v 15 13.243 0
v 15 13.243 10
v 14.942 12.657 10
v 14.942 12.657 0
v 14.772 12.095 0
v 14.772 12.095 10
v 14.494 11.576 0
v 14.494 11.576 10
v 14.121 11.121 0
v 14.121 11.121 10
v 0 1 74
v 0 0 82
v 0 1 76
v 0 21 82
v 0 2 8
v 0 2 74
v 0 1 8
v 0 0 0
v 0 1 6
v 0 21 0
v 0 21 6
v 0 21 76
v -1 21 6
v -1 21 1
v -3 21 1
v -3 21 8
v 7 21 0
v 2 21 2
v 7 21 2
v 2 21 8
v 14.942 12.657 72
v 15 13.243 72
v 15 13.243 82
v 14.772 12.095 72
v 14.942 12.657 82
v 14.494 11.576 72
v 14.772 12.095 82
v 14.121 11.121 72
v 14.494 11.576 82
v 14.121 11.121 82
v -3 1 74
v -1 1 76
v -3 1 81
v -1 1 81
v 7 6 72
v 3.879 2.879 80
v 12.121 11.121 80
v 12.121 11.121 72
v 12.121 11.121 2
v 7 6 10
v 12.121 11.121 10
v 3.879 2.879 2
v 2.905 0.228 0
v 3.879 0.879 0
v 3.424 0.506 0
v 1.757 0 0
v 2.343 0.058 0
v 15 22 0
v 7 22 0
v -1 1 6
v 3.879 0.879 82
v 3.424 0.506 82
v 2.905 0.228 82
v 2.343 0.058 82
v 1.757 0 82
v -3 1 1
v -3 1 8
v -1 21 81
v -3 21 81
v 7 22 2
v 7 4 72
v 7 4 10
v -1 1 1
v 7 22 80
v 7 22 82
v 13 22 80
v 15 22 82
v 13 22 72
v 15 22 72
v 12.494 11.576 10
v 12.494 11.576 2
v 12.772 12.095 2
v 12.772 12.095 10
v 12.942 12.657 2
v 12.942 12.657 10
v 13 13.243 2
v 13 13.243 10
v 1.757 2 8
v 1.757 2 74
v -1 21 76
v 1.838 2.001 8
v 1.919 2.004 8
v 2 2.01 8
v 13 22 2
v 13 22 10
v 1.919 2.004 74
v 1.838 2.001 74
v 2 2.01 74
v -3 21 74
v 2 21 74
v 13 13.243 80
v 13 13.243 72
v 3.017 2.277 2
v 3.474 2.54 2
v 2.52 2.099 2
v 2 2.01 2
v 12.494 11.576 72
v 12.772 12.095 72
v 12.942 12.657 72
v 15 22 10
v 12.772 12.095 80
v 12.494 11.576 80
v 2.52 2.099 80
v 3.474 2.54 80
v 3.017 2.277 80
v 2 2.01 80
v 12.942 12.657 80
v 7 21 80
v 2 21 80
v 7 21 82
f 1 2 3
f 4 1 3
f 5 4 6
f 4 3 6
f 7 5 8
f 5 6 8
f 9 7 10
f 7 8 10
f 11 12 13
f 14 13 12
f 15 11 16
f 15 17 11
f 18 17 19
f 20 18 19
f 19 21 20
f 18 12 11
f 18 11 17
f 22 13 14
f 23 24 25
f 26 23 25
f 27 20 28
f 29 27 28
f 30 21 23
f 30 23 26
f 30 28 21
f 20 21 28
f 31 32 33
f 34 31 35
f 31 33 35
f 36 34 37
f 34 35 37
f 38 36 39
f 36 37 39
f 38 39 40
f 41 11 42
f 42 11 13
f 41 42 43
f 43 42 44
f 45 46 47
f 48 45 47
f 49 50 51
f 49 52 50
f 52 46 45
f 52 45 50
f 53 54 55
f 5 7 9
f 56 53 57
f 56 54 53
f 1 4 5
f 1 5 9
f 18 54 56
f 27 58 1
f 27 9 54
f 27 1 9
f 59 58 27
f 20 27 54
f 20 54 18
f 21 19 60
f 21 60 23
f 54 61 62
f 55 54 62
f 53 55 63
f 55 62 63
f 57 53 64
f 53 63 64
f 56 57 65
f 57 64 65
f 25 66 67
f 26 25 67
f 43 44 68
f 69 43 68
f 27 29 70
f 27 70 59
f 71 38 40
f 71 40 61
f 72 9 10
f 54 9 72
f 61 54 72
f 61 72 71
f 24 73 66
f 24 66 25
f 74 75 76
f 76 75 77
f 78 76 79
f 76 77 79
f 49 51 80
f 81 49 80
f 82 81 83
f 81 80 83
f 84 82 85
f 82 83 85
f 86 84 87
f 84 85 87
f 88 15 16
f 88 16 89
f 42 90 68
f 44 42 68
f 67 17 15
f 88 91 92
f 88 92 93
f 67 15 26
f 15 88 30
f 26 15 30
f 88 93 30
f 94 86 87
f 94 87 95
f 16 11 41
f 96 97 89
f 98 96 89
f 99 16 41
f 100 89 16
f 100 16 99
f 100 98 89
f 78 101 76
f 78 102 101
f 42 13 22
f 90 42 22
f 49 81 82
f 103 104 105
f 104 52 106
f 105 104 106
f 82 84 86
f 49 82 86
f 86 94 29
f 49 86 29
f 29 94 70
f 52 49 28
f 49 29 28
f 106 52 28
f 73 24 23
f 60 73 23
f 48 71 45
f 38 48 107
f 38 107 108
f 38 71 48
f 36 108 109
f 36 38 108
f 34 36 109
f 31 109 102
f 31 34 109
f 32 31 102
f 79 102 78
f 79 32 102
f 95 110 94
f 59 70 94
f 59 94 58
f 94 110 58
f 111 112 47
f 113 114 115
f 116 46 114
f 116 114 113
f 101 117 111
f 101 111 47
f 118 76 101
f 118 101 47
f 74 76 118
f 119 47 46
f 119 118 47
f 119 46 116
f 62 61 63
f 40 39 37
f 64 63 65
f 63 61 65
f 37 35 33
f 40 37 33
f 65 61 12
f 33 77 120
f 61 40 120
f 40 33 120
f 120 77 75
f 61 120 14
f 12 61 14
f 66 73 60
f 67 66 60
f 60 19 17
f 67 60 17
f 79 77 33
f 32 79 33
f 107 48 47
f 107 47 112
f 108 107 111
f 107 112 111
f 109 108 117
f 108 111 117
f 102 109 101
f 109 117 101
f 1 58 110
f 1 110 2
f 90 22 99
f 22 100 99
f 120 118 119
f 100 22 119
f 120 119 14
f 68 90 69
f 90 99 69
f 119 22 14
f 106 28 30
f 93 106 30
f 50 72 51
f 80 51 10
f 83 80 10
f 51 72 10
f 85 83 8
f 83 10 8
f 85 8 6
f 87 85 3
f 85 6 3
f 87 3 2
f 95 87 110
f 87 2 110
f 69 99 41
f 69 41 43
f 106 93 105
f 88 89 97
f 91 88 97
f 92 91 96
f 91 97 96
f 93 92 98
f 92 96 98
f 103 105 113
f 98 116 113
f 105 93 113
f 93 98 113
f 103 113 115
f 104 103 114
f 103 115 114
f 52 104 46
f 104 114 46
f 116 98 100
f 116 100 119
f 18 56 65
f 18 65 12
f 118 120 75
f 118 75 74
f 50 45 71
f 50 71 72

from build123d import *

# Parameters (mm, degrees)
EXTRUDE_1_DEPTH       = 82
FILLET_1_R            = 3
EXTRUDE_START         = -2
EXTRUDE_2_DEPTH       = 2
EXTRUDE_START_2       = -82
EXTRUDE_3_DEPTH       = 2
CUT_EXTRUDE_1_DEPTH   = 2
CUT_EXTRUDE_2_DEPTH   = 2
CUT_EXTRUDE_3_REACH   = 114.805
SKETCH_7_R            = 2
SKETCH_7_R_2          = 3.3
SKETCH_8_R            = 2
EXTRUDE_4_DEPTH       = 18
SKETCH_9_W            = 7
SKETCH_9_H            = 20
EXTRUDE_5_DEPTH       = 2
SKETCH_10_W           = 2
SKETCH_10_H           = 20
EXTRUDE_6_DEPTH       = 1
SKETCH_11_W           = 7
SKETCH_11_H           = 20
EXTRUDE_7_DEPTH       = 2
SKETCH_12_OUTSIDE_W   = 111.698
SKETCH_12_OUTSIDE_H   = 75.698
SKETCH_12_OUTSIDE_W_2 = 10
SKETCH_12_OUTSIDE_H_2 = 22
CUT_EXTRUDE_4_DEPTH   = 8
SKETCH_14_W           = 93.129876152
SKETCH_14_H           = 88.449918806
CUT_EXTRUDE_5_DEPTH   = 108.745069493


with BuildPart() as part:
    # 草图1 → 凸台-拉伸1 (new body)
    with BuildSketch(Plane.XY):
        Polygon((0, 0), (0, 2), (3, 2), (13, 12), (13, 37), (3, 47), (-60, 47), (-60, 49), (3, 49), (15, 37), (15, 12), (3, 0), align=None)
    extrude(amount=EXTRUDE_1_DEPTH)

    # 圆角1
    fillet_1_edges = [part.edges().sort_by_distance(p)[0] for p in [
        (3, 0, 41),
        (15, 12, 41),
        (15, 37, 41),
        (3, 49, 41),
        (3, 2, 41),
        (13, 12, 41),
        (13, 37, 41),
        (3, 47, 41),
    ]]
    fillet(fillet_1_edges, radius=FILLET_1_R)

    # 草图4 → 凸台-拉伸2 (add)
    with BuildSketch(Plane(origin=(0, 0, 0), x_dir=(-1, 0, 0), z_dir=(0, 0, -1)).offset(EXTRUDE_START)):
        with BuildLine():
            Line((0, 0), (0, 26))
            Line((0, 26), (4, 26))
            Line((4, 26), (4, 27))
            Line((4, 27), (60, 27))
            Line((60, 27), (60, 49))
            Line((60, 49), (-1.757359313, 49))
            ThreePointArc((-1.757359313, 49), (-2.90540961, 48.771638598), (-3.878679656, 48.121320344))
            Line((-3.878679656, 48.121320344), (-14.121320344, 37.878679656))
            ThreePointArc((-14.121320344, 37.878679656), (-14.771638598, 36.90540961), (-15, 35.757359313))
            Line((-15, 35.757359313), (-15, 13.242640687))
            ThreePointArc((-15, 13.242640687), (-14.771638598, 12.09459039), (-14.121320344, 11.121320344))
            Line((-14.121320344, 11.121320344), (-3.878679656, 0.878679656))
            ThreePointArc((-3.878679656, 0.878679656), (-2.90540961, 0.228361402), (-1.757359313, 0))
            Line((-1.757359313, 0), (0, 0))
        make_face()
    extrude(amount=EXTRUDE_2_DEPTH)

    # 草图4<2> → 凸台-拉伸3 (add)
    with BuildSketch(Plane(origin=(0, 0, 0), x_dir=(-1, 0, 0), z_dir=(0, 0, -1)).offset(EXTRUDE_START_2)):
        with BuildLine():
            Line((0, 0), (0, 26))
            Line((0, 26), (4, 26))
            Line((4, 26), (4, 27))
            Line((4, 27), (60, 27))
            Line((60, 27), (60, 49))
            Line((60, 49), (-1.757359313, 49))
            ThreePointArc((-1.757359313, 49), (-2.90540961, 48.771638598), (-3.878679656, 48.121320344))
            Line((-3.878679656, 48.121320344), (-14.121320344, 37.878679656))
            ThreePointArc((-14.121320344, 37.878679656), (-14.771638598, 36.90540961), (-15, 35.757359313))
            Line((-15, 35.757359313), (-15, 13.242640687))
            ThreePointArc((-15, 13.242640687), (-14.771638598, 12.09459039), (-14.121320344, 11.121320344))
            Line((-14.121320344, 11.121320344), (-3.878679656, 0.878679656))
            ThreePointArc((-3.878679656, 0.878679656), (-2.90540961, 0.228361402), (-1.757359313, 0))
            Line((-1.757359313, 0), (0, 0))
        make_face()
    extrude(amount=EXTRUDE_3_DEPTH)

    # 草图5 → 切除-拉伸1 (cut)
    with BuildSketch(Plane(origin=(0, 0, 0), x_dir=(-1, 0, 0), z_dir=(0, 0, -1))):
        Polygon((2.661599935, 45.0208), (2.661599935, 31), (0, 31), (0, 29.863095934), (55.9999896, 29.863095934), (55.9999896, 31), (53.469479015, 31), (53.469479015, 44.2999988), (37.469480535, 44.2999988), (37.469480535, 31), (36.113001155, 31), (36.113001155, 38.112), (19.512998795, 38.112), (19.512998795, 31), (17.861600015, 31), (17.861600015, 45.0208), align=None)
    extrude(amount=-CUT_EXTRUDE_1_DEPTH, mode=Mode.SUBTRACT)

    # 草图6 → 切除-拉伸2 (cut)
    with BuildSketch(Plane.XY.offset(82)):
        Polygon((-55.9999896, 31), (-49.543385864, 31), (-49.543385864, 37.1214), (-33.143393264, 37.1214), (-33.143393264, 32.1214), (-29.143393264, 32.1214), (-29.143393264, 31), (-10.34416017, 31), (-10.34416017, 33.50000008), (-6.34416055, 33.50000008), (-6.34416055, 31), (0, 31), (0, 27), (0, 26), (-4, 26), (-4, 27), (-55.9999896, 27), align=None)
    extrude(amount=-CUT_EXTRUDE_2_DEPTH, mode=Mode.SUBTRACT)

    # 草图7 → 切除-拉伸3 (cut, up to next)
    with BuildSketch(Plane(origin=(0, 49, 0), x_dir=(1, 0, 0), z_dir=(0, 1, 0)), mode=Mode.PRIVATE) as cut_extrude_3_sk1:
        with Locations((-52.4947896, -81.4948)):
            Circle(SKETCH_7_R)
    cut_extrude_3_tool1 = extrude(cut_extrude_3_sk1.sketch, amount=-CUT_EXTRUDE_3_REACH, mode=Mode.PRIVATE) & part.part
    # 草图7 → 切除-拉伸3 (cut, up to next)
    with BuildSketch(Plane(origin=(0, 49, 0), x_dir=(1, 0, 0), z_dir=(0, 1, 0)), mode=Mode.PRIVATE) as cut_extrude_3_sk2:
        with Locations((-3.4981896, -81.4948)):
            Circle(SKETCH_7_R)
    cut_extrude_3_tool2 = extrude(cut_extrude_3_sk2.sketch, amount=-CUT_EXTRUDE_3_REACH, mode=Mode.PRIVATE) & part.part
    # 草图7 → 切除-拉伸3 (cut, up to next)
    with BuildSketch(Plane(origin=(0, 49, 0), x_dir=(1, 0, 0), z_dir=(0, 1, 0)), mode=Mode.PRIVATE) as cut_extrude_3_sk3:
        with Locations((-43.742640687, -20.5)):
            Circle(SKETCH_7_R_2)
    cut_extrude_3_tool3 = extrude(cut_extrude_3_sk3.sketch, amount=-CUT_EXTRUDE_3_REACH, mode=Mode.PRIVATE) & part.part
    # 草图7 → 切除-拉伸3 (cut, up to next)
    with BuildSketch(Plane(origin=(0, 49, 0), x_dir=(1, 0, 0), z_dir=(0, 1, 0)), mode=Mode.PRIVATE) as cut_extrude_3_sk4:
        with Locations((-2.742640687, -20.5)):
            Circle(SKETCH_7_R_2)
    cut_extrude_3_tool4 = extrude(cut_extrude_3_sk4.sketch, amount=-CUT_EXTRUDE_3_REACH, mode=Mode.PRIVATE) & part.part
    # 草图7 → 切除-拉伸3 (cut, up to next)
    with BuildSketch(Plane(origin=(0, 49, 0), x_dir=(1, 0, 0), z_dir=(0, 1, 0)), mode=Mode.PRIVATE) as cut_extrude_3_sk5:
        with Locations((-2.742640687, -61.5)):
            Circle(SKETCH_7_R_2)
    cut_extrude_3_tool5 = extrude(cut_extrude_3_sk5.sketch, amount=-CUT_EXTRUDE_3_REACH, mode=Mode.PRIVATE) & part.part
    # 草图7 → 切除-拉伸3 (cut, up to next)
    with BuildSketch(Plane(origin=(0, 49, 0), x_dir=(1, 0, 0), z_dir=(0, 1, 0)), mode=Mode.PRIVATE) as cut_extrude_3_sk6:
        with Locations((-43.742640687, -61.5)):
            Circle(SKETCH_7_R_2)
    cut_extrude_3_tool6 = extrude(cut_extrude_3_sk6.sketch, amount=-CUT_EXTRUDE_3_REACH, mode=Mode.PRIVATE) & part.part
    # 草图7 → 切除-拉伸3 (cut, up to next)
    with BuildSketch(Plane(origin=(0, 49, 0), x_dir=(1, 0, 0), z_dir=(0, 1, 0)), mode=Mode.PRIVATE) as cut_extrude_3_sk7:
        with BuildLine():
            Line((-50, -66), (-50, -78))
            Line((-50, -78), (-53.9999896, -78))
            ThreePointArc((-53.9999896, -78), (-55.414203162, -78.585786438), (-55.9999896, -80))
            Line((-55.9999896, -80), (-60, -80))
            Line((-60, -80), (-60, -23.494789))
            ThreePointArc((-60, -23.494789), (-59.121320344, -25.616109344), (-57, -26.494789))
            Line((-57, -26.494789), (-52.436945771, -26.494789))
            ThreePointArc((-52.436945771, -26.494789), (-50.713764891, -27.208553891), (-50, -28.931734771))
            Line((-50, -28.931734771), (-50, -41))
            Line((-50, -41), (-50, -66))
        make_face()
    cut_extrude_3_tool7 = extrude(cut_extrude_3_sk7.sketch, amount=-CUT_EXTRUDE_3_REACH, mode=Mode.PRIVATE) & part.part
    # 草图7 → 切除-拉伸3 (cut, up to next)
    with BuildSketch(Plane(origin=(0, 49, 0), x_dir=(1, 0, 0), z_dir=(0, 1, 0)), mode=Mode.PRIVATE) as cut_extrude_3_sk8:
        with BuildLine():
            Line((-38.742640687, -20.5), (-38.742640687, -16))
            Line((-38.742640687, -16), (-7.742640687, -16))
            Line((-7.742640687, -16), (-7.742640687, -20.5))
            ThreePointArc((-7.742640687, -20.5), (-6.278174593, -24.035533906), (-2.742640687, -25.5))
            Line((-2.742640687, -25.5), (1.757359313, -25.5))
            Line((1.757359313, -25.5), (1.757359313, -56.5))
            Line((1.757359313, -56.5), (-2.742640687, -56.5))
            ThreePointArc((-2.742640687, -56.5), (-6.278174593, -57.964466094), (-7.742640687, -61.5))
            Line((-7.742640687, -61.5), (-7.742640687, -66))
            Line((-7.742640687, -66), (-38.742640687, -66))
            Line((-38.742640687, -66), (-38.742640687, -61.5))
            ThreePointArc((-38.742640687, -61.5), (-40.207106781, -57.964466094), (-43.742640687, -56.5))
            Line((-43.742640687, -56.5), (-48.242640687, -56.5))
            Line((-48.242640687, -56.5), (-48.242640687, -25.5))
            Line((-48.242640687, -25.5), (-43.742640687, -25.5))
            ThreePointArc((-43.742640687, -25.5), (-40.207106781, -24.035533906), (-38.742640687, -20.5))
        make_face()
    cut_extrude_3_tool8 = extrude(cut_extrude_3_sk8.sketch, amount=-CUT_EXTRUDE_3_REACH, mode=Mode.PRIVATE) & part.part
    add(cut_extrude_3_tool1.solids().sort_by_distance((-52.49479, 49, 81.4948))[0], mode=Mode.SUBTRACT)
    add(cut_extrude_3_tool2.solids().sort_by_distance((-3.49819, 49, 81.4948))[0], mode=Mode.SUBTRACT)
    add(cut_extrude_3_tool3.solids().sort_by_distance((-43.742641, 49, 20.5))[0], mode=Mode.SUBTRACT)
    add(cut_extrude_3_tool4.solids().sort_by_distance((-2.742641, 49, 20.5))[0], mode=Mode.SUBTRACT)
    add(cut_extrude_3_tool5.solids().sort_by_distance((-2.742641, 49, 61.5))[0], mode=Mode.SUBTRACT)
    add(cut_extrude_3_tool6.solids().sort_by_distance((-43.742641, 49, 61.5))[0], mode=Mode.SUBTRACT)
    add(cut_extrude_3_tool7.solids().sort_by_distance((-55.073425, 49, 52.662221))[0], mode=Mode.SUBTRACT)
    add(cut_extrude_3_tool8.solids().sort_by_distance((-23.242641, 49, 41))[0], mode=Mode.SUBTRACT)

    # 草图8 → 凸台-拉伸4 (add)
    # profile 1 of 2: a face of its own
    with BuildSketch(Plane(origin=(0, 49, 0), x_dir=(1, 0, 0), z_dir=(0, 1, 0))):
        with BuildLine():
            Line((-6.34416055, -79), (0, -79))
            Line((0, -79), (0, -82))
            ThreePointArc((0, -82), (-0.878677535, -84.121318222), (-2.999994, -85))
            Line((-2.999994, -85), (-6.34416055, -85))
            Line((-6.34416055, -85), (-6.34416055, -82))
            Line((-6.34416055, -82), (-6.34416055, -79))
        make_face()
        with Locations((-3.4981896, -81.4948)):
            Circle(SKETCH_8_R, mode=Mode.SUBTRACT)
    # profile 2 of 2: a face of its own
    with BuildSketch(Plane(origin=(0, 49, 0), x_dir=(1, 0, 0), z_dir=(0, 1, 0))):
        with BuildLine():
            Line((-49.543385864, -82), (-49.543385864, -79))
            Line((-49.543385864, -79), (-55.9999896, -79))
            Line((-55.9999896, -79), (-55.9999896, -82))
            ThreePointArc((-55.9999896, -82), (-55.121313822, -84.12131998), (-52.9999956, -85))
            Line((-52.9999956, -85), (-49.543385856, -85))
            Line((-49.543385856, -85), (-49.543385864, -82))
        make_face()
        with Locations((-52.4947896, -81.4948)):
            Circle(SKETCH_8_R, mode=Mode.SUBTRACT)
    extrude(amount=-EXTRUDE_4_DEPTH)

    # 草图9 → 凸台-拉伸5 (add)
    with BuildSketch(Plane.ZY):
        with Locations((4.5, 11)):
            Rectangle(SKETCH_9_W, SKETCH_9_H)
        with Locations((77.5, 11)):
            Rectangle(SKETCH_9_W, SKETCH_9_H)
    extrude(amount=-EXTRUDE_5_DEPTH)

    # 草图10 → 凸台-拉伸6 (add)
    with BuildSketch(Plane.ZY):
        with Locations((7, 11)):
            Rectangle(SKETCH_10_W, SKETCH_10_H)
        with Locations((75, 11)):
            Rectangle(SKETCH_10_W, SKETCH_10_H)
    extrude(amount=EXTRUDE_6_DEPTH)

    # 草图11 → 凸台-拉伸7 (add)
    with BuildSketch(Plane.ZY.offset(1)):
        with Locations((4.5, 11)):
            Rectangle(SKETCH_11_W, SKETCH_11_H)
        with Locations((77.5, 11)):
            Rectangle(SKETCH_11_W, SKETCH_11_H)
    extrude(amount=EXTRUDE_7_DEPTH)

    # 草图12 outside → 切除-拉伸4 (cut)
    with BuildSketch(Plane(origin=(15, 0, 0), x_dir=(0, 0, -1), z_dir=(1, 0, 0))):
        with Locations((-42.5, 24.5)):
            Rectangle(SKETCH_12_OUTSIDE_W, SKETCH_12_OUTSIDE_H)
        with Locations((-77, 11)):
            Rectangle(SKETCH_12_OUTSIDE_W_2, SKETCH_12_OUTSIDE_H_2, mode=Mode.SUBTRACT)
        with Locations((-5, 11)):
            Rectangle(SKETCH_12_OUTSIDE_W_2, SKETCH_12_OUTSIDE_H_2, mode=Mode.SUBTRACT)
    extrude(amount=-CUT_EXTRUDE_4_DEPTH, mode=Mode.SUBTRACT)

    # 草图14 → 切除-拉伸5 (cut, through all)
    with BuildSketch(Plane(origin=(0, 21, 0), x_dir=(1, 0, 0), z_dir=(0, 1, 0))):
        with Locations((-39.564938076, -44.224959403)):
            Rectangle(SKETCH_14_W, SKETCH_14_H)
    extrude(amount=CUT_EXTRUDE_5_DEPTH, mode=Mode.SUBTRACT)


solid = part.part
